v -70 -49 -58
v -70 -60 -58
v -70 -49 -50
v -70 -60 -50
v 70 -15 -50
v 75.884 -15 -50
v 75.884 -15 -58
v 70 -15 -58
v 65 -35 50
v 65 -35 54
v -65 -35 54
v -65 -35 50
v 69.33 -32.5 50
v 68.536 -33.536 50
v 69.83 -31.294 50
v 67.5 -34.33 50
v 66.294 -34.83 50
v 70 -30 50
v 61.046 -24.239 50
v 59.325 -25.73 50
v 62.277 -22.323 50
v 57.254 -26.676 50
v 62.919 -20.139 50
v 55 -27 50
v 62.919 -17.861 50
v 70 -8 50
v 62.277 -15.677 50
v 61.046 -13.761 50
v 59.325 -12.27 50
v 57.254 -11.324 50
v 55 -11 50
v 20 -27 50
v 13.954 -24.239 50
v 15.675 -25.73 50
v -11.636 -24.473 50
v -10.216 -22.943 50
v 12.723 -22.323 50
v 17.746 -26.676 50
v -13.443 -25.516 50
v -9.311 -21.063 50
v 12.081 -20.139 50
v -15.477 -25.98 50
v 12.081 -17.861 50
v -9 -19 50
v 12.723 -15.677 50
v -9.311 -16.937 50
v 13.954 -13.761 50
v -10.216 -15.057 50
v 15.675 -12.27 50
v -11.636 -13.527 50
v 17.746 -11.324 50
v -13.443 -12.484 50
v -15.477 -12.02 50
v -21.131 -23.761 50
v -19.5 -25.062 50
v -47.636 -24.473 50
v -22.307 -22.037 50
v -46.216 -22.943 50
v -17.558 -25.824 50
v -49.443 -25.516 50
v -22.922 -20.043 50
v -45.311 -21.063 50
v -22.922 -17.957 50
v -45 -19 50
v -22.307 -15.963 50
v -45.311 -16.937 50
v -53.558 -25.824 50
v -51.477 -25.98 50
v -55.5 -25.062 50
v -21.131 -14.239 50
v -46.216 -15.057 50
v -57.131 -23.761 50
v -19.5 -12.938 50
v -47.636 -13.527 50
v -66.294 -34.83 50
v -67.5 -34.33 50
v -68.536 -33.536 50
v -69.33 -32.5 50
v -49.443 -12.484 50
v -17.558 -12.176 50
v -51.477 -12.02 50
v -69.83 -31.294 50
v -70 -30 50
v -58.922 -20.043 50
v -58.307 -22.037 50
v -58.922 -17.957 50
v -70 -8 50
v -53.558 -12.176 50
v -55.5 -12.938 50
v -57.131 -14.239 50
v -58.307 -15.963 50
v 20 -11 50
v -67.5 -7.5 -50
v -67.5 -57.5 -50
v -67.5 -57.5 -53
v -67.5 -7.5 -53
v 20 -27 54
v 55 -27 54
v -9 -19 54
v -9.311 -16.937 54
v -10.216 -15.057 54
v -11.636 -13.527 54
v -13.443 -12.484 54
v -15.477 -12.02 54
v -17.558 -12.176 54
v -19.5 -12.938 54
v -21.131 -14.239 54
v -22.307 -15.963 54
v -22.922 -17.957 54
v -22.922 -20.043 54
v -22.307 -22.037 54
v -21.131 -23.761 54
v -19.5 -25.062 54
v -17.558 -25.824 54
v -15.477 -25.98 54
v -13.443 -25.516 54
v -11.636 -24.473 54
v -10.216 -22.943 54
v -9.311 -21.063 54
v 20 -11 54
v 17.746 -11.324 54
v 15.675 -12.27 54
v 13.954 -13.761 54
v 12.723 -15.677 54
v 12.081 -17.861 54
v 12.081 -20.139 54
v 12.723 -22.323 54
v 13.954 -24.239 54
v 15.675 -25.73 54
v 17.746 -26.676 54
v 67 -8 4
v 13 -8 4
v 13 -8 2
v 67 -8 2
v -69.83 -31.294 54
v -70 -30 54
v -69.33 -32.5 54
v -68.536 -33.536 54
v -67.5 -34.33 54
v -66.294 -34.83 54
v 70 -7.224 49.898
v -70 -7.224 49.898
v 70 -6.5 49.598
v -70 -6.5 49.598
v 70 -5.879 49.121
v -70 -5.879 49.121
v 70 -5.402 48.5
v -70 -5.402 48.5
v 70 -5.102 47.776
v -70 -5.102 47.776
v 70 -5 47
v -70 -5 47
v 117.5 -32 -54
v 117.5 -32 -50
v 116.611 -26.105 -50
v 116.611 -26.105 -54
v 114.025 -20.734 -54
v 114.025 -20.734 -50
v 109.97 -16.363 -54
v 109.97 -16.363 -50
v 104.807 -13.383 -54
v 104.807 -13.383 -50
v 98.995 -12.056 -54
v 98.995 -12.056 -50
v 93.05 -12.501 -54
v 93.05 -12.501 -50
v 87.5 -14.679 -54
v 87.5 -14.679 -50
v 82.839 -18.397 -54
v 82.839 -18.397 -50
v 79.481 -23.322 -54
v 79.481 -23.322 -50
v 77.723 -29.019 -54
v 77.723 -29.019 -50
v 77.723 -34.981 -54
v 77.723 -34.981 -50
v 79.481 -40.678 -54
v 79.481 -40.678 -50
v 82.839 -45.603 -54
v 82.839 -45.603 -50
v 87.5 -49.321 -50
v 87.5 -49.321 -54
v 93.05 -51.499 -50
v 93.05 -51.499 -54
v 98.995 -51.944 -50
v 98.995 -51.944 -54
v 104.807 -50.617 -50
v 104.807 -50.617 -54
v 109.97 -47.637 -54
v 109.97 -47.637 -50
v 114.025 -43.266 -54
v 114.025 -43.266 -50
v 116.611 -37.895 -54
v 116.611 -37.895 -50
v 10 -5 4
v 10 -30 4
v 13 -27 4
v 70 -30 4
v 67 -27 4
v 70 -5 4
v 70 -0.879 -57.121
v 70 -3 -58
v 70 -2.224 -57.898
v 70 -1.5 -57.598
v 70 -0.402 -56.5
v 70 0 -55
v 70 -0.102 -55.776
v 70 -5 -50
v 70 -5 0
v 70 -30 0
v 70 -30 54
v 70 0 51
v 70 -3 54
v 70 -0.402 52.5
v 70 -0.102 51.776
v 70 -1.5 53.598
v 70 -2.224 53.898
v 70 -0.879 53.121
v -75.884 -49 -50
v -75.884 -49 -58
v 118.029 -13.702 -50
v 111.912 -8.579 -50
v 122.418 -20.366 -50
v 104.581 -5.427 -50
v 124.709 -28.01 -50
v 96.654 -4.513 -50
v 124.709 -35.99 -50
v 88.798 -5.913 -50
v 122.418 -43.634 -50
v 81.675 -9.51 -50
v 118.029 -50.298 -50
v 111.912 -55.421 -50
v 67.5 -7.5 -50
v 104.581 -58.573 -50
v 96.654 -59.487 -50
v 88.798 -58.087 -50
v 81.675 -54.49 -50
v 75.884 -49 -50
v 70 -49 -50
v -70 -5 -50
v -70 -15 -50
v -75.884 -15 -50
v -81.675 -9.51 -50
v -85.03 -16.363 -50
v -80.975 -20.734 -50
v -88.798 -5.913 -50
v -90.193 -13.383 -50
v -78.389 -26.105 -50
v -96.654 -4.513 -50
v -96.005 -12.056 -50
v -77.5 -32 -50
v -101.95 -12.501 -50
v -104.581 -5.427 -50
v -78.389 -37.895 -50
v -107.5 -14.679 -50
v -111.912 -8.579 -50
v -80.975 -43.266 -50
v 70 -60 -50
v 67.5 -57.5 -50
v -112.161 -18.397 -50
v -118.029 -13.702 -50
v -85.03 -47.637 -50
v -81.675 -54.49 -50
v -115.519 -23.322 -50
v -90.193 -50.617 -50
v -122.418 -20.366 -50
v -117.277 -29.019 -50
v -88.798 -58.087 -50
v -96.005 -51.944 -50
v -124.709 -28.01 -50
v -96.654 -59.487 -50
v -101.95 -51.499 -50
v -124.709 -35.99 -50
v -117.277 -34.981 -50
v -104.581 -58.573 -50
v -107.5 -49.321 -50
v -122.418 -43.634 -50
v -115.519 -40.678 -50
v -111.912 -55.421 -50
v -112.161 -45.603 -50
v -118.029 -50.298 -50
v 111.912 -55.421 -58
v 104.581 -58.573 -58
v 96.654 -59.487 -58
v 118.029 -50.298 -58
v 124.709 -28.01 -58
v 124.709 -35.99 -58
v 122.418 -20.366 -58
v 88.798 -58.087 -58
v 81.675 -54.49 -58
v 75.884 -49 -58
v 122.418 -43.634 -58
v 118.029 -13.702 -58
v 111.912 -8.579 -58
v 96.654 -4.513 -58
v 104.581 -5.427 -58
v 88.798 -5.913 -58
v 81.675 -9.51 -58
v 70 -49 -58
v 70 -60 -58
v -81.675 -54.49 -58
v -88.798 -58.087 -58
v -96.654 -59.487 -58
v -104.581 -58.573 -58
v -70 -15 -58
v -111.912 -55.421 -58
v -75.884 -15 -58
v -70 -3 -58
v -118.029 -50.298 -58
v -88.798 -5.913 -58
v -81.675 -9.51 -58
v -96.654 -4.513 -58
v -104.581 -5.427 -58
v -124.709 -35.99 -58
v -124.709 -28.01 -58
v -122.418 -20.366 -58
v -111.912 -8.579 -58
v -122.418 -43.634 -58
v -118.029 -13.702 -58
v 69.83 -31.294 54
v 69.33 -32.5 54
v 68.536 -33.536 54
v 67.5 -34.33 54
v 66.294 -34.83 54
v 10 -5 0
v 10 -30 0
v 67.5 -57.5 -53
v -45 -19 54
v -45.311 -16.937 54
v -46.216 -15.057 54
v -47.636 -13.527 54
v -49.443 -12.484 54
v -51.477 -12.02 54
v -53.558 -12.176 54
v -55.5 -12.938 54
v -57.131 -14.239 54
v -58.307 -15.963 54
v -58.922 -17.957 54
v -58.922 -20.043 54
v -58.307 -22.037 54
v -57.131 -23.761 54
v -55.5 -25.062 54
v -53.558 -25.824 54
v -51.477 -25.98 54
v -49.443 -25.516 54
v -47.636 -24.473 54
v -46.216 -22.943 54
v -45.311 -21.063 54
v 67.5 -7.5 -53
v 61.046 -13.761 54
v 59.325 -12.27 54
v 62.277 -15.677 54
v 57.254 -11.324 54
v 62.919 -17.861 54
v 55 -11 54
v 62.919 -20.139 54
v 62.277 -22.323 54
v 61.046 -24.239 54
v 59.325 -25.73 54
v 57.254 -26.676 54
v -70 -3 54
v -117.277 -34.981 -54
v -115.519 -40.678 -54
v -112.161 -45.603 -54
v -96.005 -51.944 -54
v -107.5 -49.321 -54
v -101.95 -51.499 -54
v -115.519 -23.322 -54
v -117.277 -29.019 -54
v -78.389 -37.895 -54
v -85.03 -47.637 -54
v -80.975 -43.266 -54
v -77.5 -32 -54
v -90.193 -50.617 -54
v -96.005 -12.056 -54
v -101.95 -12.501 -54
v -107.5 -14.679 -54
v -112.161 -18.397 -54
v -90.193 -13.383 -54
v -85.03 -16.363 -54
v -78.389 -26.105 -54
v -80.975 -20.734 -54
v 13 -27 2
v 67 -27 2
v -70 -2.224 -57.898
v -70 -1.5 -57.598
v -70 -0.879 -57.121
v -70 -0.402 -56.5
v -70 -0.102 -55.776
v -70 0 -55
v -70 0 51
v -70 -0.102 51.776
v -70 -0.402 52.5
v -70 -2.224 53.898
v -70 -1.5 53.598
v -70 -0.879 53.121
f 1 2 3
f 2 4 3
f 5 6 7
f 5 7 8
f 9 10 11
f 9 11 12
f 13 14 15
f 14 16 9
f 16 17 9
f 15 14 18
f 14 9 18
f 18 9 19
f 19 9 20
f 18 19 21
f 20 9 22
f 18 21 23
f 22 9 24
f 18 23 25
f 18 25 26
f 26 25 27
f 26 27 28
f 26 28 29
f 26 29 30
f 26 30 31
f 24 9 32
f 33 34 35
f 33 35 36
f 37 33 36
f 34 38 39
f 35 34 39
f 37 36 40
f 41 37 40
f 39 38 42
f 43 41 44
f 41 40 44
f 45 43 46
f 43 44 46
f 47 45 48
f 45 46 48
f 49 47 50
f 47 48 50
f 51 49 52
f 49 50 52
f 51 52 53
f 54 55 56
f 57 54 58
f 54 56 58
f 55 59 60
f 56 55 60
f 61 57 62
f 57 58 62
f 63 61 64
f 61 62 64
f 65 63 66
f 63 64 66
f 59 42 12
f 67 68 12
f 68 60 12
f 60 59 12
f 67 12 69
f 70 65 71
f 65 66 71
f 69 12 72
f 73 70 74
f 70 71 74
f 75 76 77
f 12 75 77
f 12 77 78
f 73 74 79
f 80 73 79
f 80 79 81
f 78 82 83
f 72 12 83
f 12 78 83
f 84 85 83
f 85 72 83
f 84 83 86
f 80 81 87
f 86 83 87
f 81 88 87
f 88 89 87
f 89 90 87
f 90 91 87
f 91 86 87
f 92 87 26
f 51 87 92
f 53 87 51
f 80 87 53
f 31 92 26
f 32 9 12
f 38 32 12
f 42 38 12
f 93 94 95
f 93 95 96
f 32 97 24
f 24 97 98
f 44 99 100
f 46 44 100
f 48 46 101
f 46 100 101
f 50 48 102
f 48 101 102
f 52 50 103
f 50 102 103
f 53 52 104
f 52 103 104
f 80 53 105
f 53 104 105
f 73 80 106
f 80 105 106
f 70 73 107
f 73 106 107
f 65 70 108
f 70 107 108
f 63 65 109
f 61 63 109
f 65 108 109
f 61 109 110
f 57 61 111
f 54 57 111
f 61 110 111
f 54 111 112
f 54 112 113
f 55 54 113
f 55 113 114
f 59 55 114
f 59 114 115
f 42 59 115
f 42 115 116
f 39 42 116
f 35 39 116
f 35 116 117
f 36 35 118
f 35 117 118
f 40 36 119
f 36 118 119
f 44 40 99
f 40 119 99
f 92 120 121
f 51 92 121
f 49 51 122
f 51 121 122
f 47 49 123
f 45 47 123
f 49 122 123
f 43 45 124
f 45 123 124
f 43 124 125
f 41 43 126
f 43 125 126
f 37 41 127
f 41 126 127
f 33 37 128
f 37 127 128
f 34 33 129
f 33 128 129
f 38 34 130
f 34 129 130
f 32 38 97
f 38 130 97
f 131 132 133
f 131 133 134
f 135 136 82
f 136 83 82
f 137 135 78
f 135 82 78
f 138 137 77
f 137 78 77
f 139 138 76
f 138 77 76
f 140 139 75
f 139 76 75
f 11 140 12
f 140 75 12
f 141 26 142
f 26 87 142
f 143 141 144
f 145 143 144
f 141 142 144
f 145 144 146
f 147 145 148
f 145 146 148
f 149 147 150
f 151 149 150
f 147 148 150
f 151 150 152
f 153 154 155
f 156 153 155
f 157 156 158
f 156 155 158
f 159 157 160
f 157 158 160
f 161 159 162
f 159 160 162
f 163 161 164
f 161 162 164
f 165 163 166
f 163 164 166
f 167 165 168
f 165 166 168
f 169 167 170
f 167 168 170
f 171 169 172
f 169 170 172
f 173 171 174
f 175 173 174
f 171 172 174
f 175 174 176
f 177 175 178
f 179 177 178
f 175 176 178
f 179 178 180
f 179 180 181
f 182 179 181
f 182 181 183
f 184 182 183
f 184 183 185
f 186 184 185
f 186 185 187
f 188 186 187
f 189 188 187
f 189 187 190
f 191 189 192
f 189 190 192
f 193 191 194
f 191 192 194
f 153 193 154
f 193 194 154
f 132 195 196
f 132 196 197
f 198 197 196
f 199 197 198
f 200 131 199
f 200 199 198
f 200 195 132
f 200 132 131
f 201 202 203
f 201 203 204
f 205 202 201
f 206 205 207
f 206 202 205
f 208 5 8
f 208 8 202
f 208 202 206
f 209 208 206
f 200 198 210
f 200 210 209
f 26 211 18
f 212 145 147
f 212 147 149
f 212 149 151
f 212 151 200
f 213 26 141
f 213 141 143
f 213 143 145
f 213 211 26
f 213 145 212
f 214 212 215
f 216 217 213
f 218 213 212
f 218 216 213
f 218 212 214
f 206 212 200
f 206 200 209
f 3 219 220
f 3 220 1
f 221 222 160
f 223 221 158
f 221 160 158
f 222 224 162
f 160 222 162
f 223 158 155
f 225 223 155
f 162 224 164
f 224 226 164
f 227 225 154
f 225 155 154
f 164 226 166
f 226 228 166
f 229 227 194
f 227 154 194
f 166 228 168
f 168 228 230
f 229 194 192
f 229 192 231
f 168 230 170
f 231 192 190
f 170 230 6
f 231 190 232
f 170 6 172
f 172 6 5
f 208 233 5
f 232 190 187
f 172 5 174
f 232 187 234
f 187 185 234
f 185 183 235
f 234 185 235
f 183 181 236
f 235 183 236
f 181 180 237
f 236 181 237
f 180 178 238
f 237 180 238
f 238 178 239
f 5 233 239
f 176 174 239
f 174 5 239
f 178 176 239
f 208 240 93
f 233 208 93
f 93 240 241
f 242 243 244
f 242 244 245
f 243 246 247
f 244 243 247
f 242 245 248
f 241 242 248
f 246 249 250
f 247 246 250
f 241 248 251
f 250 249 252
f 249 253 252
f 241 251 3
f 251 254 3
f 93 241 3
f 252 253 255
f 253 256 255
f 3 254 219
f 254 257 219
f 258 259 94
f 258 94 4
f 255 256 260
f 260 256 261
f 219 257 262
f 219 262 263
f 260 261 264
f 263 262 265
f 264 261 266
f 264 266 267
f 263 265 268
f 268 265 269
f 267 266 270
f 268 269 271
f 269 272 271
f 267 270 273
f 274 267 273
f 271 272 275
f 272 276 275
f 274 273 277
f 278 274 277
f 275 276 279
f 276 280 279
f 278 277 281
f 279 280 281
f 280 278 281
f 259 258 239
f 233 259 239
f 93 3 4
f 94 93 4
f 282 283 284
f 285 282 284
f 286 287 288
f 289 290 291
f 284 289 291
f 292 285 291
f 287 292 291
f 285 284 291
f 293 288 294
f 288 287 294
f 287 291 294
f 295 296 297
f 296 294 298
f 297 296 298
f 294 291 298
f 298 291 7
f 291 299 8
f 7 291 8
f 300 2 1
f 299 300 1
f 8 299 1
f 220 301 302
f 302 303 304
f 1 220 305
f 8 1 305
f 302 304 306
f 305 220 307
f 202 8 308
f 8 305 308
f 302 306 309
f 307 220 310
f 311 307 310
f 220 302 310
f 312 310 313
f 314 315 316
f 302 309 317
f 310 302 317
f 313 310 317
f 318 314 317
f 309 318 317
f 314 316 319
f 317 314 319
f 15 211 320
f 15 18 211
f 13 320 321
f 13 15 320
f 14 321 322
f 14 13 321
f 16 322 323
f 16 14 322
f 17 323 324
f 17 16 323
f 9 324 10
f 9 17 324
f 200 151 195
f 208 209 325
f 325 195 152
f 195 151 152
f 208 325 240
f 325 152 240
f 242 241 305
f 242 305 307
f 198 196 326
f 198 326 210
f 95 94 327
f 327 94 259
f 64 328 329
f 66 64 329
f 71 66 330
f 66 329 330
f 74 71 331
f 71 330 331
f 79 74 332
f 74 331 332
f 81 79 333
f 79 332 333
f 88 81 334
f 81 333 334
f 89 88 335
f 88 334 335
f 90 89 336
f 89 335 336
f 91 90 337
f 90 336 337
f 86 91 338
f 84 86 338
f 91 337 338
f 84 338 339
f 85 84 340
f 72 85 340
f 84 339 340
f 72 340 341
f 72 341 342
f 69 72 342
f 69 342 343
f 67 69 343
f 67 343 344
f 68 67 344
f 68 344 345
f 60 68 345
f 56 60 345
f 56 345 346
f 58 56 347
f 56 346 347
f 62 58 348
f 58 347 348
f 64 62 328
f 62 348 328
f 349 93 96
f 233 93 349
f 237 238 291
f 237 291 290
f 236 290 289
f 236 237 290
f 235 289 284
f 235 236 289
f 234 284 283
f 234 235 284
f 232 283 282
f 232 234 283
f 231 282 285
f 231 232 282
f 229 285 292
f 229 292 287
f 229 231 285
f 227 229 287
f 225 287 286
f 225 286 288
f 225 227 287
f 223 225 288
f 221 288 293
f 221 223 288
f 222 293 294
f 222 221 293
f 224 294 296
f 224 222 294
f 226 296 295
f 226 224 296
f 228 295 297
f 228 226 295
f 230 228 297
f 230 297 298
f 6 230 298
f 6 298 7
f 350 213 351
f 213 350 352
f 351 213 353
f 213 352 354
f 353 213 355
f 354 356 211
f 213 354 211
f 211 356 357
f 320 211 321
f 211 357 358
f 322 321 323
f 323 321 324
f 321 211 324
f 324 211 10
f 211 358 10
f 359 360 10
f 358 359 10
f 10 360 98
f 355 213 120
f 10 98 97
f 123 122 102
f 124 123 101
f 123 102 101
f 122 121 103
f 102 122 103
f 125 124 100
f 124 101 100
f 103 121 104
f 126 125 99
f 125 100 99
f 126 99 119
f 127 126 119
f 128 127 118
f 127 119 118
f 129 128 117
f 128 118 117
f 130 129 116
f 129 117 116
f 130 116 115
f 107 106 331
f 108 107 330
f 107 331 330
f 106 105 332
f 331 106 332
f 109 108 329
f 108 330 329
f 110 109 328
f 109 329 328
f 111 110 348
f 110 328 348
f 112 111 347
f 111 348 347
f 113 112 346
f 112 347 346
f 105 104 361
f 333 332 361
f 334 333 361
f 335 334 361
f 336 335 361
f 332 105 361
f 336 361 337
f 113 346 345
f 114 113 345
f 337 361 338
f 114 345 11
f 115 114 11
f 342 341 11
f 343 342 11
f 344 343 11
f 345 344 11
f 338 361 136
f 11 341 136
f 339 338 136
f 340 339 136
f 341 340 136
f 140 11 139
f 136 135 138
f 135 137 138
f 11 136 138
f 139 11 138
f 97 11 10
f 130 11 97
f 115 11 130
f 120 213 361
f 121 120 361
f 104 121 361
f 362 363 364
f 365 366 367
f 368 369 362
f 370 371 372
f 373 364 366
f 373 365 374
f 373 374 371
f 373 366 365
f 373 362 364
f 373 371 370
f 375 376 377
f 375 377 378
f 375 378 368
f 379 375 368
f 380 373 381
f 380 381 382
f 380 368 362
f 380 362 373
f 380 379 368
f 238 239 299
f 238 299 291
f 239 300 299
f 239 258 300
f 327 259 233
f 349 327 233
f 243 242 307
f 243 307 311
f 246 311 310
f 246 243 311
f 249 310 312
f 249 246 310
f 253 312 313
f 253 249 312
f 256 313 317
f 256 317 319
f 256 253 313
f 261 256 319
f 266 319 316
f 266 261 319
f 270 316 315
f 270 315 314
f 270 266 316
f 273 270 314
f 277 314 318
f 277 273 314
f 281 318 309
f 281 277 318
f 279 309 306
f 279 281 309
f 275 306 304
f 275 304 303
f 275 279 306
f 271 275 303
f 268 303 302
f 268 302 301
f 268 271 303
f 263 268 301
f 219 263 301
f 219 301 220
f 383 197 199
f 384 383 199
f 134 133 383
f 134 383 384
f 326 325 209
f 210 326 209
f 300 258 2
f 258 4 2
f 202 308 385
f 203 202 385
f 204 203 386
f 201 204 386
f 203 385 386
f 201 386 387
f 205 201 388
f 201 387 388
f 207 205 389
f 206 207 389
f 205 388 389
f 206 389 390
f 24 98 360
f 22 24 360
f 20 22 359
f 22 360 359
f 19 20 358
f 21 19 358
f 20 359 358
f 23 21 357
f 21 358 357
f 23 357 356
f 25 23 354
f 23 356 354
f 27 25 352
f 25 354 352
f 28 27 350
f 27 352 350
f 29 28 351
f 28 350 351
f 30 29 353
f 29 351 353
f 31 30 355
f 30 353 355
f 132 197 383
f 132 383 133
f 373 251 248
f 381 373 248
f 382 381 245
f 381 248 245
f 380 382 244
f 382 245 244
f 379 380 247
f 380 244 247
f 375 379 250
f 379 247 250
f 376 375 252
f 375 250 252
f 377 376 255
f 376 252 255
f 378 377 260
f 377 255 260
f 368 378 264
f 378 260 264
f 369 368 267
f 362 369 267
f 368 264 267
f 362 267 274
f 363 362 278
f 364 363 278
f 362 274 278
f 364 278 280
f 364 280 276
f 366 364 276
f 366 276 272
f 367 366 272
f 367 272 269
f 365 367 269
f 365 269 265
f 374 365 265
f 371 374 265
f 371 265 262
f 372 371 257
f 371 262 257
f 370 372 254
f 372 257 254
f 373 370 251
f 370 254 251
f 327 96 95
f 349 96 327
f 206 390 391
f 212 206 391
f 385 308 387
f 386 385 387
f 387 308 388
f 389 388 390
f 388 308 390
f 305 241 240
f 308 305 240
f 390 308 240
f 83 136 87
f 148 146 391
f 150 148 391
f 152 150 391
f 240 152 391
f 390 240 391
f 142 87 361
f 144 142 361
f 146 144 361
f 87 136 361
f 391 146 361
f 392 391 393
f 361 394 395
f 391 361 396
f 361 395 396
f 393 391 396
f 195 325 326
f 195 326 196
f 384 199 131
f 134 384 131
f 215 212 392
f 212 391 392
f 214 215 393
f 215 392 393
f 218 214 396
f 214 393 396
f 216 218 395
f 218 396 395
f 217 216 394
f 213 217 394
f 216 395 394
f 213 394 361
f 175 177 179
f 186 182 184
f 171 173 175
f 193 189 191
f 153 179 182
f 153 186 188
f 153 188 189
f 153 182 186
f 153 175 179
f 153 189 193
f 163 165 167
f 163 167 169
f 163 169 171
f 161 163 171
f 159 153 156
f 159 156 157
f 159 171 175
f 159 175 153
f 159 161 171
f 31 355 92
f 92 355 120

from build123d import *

# Parameters (mm, degrees)
F1_DEPTH      = 70
F1_DEPTH_BACK = 70
F2_R          = 7
F3_DEPTH      = 4
F4_W          = 135
F4_H          = 50
F5_DEPTH      = 3
F7_DEPTH      = 8
F8_R          = 20
F9_DEPTH      = 4
F10_W         = 60
F10_H         = 4
F11_DEPTH     = 25
F12_W         = 54
F12_H         = 19
F13_DEPTH     = 2
F14_R         = 5


with BuildPart() as f1:
    # F0 (on Right) → F1 (new body, two sides)
    with BuildSketch(Plane.YZ) as f1_sk:
        with BuildLine():
            Line((0, -55), (0, 51))
            ThreePointArc((0, 51), (-0.8786796564, 53.1213203436), (-3, 54))
            Line((-3, 54), (-35, 54))
            Line((-35, 54), (-35, 50))
            Line((-35, 50), (-8, 50))
            ThreePointArc((-8, 50), (-5.8786796564, 49.1213203436), (-5, 47))
            Line((-5, 47), (-5, -50))
            Line((-5, -50), (-60, -50))
            Line((-60, -50), (-60, -58))
            Line((-60, -58), (-3, -58))
            ThreePointArc((-3, -58), (-0.8786796564, -57.1213203436), (0, -55))
        make_face()
    extrude(amount=-F1_DEPTH)
    extrude(f1_sk.sketch, amount=F1_DEPTH_BACK)

    # F2 (on face) → F3 (cut, through all)
    with BuildSketch(Plane.XY.offset(54)):
        with BuildLine():
            Line((55, -11), (20, -11))
            ThreePointArc((20, -11), (12, -19), (20, -27))
            Line((20, -27), (55, -27))
            ThreePointArc((55, -27), (63, -19), (55, -11))
        make_face()
        with Locations((-16, -19)):
            Circle(F2_R)
        with Locations((-52, -19)):
            Circle(F2_R)
    extrude(amount=-F3_DEPTH, mode=Mode.SUBTRACT)

    # F4 (on face) → F5 (cut)
    with BuildSketch(Plane.XY.offset(-50)):
        with Locations((0, -32.5)):
            Rectangle(F4_W, F4_H)
    extrude(amount=-F5_DEPTH, mode=Mode.SUBTRACT)

    # F6 (on face) → F7 (join)
    with BuildSketch(Plane.XY.offset(-50)):
        with BuildLine():
            Line((70, -32), (70, -49))
            Line((70, -49), (75.8840336788, -49))
            ThreePointArc((75.8840336788, -49), (71.5126081163, -40.9947464157), (70, -32))
        make_face()
        with BuildLine():
            ThreePointArc((70, -32), (71.5126081163, -40.9947464157), (75.8840336788, -49))
            ThreePointArc((75.8840336788, -49), (106.4947464157, -57.9873918837), (125, -32))
            ThreePointArc((125, -32), (106.4947464157, -6.0126081163), (75.8840336788, -15))
            ThreePointArc((75.8840336788, -15), (71.5126081163, -23.0052535843), (70, -32))
        make_face()
        with BuildLine():
            Line((70, -15), (70, -32))
            ThreePointArc((70, -32), (71.5126081163, -23.0052535843), (75.8840336788, -15))
            Line((75.8840336788, -15), (70, -15))
        make_face()
        with BuildLine():
            ThreePointArc((-75.8840336788, -49), (-71.5126081163, -40.9947464157), (-70, -32))
            ThreePointArc((-70, -32), (-71.5126081163, -23.0052535843), (-75.8840336788, -15))
            ThreePointArc((-75.8840336788, -15), (-125, -32), (-75.8840336788, -49))
        make_face()
        with BuildLine():
            Line((-70, -49), (-70, -32))
            ThreePointArc((-70, -32), (-71.5126081163, -40.9947464157), (-75.8840336788, -49))
            Line((-75.8840336788, -49), (-70, -49))
        make_face()
        with BuildLine():
            ThreePointArc((-75.8840336788, -15), (-71.5126081163, -23.0052535843), (-70, -32))
            Line((-70, -32), (-70, -15))
            Line((-70, -15), (-75.8840336788, -15))
        make_face()
    extrude(amount=-F7_DEPTH)

    # F8 (on face) → F9 (cut)
    with BuildSketch(Plane.XY.offset(-50)):
        with Locations((-97.5, -32)):
            Circle(F8_R)
        with Locations((97.5, -32)):
            Circle(F8_R)
    extrude(amount=-F9_DEPTH, mode=Mode.SUBTRACT)

    # F10 (on face) → F11 (join)
    with BuildSketch(Plane.XZ.offset(5)):
        with Locations((40, 2)):
            Rectangle(F10_W, F10_H)
    extrude(amount=F11_DEPTH)

    # F12 (on face) → F13 (cut)
    with BuildSketch(Plane.XY.offset(4)):
        with Locations((40, -17.5)):
            Rectangle(F12_W, F12_H)
    extrude(amount=-F13_DEPTH, mode=Mode.SUBTRACT)

    # F14
    f14_edges = [f1.edges().sort_by_distance(p)[0] for p in [
        (-70, -35, 52),
        (70, -35, 52),
    ]]
    fillet(f14_edges, radius=F14_R)


solid = f1.part
